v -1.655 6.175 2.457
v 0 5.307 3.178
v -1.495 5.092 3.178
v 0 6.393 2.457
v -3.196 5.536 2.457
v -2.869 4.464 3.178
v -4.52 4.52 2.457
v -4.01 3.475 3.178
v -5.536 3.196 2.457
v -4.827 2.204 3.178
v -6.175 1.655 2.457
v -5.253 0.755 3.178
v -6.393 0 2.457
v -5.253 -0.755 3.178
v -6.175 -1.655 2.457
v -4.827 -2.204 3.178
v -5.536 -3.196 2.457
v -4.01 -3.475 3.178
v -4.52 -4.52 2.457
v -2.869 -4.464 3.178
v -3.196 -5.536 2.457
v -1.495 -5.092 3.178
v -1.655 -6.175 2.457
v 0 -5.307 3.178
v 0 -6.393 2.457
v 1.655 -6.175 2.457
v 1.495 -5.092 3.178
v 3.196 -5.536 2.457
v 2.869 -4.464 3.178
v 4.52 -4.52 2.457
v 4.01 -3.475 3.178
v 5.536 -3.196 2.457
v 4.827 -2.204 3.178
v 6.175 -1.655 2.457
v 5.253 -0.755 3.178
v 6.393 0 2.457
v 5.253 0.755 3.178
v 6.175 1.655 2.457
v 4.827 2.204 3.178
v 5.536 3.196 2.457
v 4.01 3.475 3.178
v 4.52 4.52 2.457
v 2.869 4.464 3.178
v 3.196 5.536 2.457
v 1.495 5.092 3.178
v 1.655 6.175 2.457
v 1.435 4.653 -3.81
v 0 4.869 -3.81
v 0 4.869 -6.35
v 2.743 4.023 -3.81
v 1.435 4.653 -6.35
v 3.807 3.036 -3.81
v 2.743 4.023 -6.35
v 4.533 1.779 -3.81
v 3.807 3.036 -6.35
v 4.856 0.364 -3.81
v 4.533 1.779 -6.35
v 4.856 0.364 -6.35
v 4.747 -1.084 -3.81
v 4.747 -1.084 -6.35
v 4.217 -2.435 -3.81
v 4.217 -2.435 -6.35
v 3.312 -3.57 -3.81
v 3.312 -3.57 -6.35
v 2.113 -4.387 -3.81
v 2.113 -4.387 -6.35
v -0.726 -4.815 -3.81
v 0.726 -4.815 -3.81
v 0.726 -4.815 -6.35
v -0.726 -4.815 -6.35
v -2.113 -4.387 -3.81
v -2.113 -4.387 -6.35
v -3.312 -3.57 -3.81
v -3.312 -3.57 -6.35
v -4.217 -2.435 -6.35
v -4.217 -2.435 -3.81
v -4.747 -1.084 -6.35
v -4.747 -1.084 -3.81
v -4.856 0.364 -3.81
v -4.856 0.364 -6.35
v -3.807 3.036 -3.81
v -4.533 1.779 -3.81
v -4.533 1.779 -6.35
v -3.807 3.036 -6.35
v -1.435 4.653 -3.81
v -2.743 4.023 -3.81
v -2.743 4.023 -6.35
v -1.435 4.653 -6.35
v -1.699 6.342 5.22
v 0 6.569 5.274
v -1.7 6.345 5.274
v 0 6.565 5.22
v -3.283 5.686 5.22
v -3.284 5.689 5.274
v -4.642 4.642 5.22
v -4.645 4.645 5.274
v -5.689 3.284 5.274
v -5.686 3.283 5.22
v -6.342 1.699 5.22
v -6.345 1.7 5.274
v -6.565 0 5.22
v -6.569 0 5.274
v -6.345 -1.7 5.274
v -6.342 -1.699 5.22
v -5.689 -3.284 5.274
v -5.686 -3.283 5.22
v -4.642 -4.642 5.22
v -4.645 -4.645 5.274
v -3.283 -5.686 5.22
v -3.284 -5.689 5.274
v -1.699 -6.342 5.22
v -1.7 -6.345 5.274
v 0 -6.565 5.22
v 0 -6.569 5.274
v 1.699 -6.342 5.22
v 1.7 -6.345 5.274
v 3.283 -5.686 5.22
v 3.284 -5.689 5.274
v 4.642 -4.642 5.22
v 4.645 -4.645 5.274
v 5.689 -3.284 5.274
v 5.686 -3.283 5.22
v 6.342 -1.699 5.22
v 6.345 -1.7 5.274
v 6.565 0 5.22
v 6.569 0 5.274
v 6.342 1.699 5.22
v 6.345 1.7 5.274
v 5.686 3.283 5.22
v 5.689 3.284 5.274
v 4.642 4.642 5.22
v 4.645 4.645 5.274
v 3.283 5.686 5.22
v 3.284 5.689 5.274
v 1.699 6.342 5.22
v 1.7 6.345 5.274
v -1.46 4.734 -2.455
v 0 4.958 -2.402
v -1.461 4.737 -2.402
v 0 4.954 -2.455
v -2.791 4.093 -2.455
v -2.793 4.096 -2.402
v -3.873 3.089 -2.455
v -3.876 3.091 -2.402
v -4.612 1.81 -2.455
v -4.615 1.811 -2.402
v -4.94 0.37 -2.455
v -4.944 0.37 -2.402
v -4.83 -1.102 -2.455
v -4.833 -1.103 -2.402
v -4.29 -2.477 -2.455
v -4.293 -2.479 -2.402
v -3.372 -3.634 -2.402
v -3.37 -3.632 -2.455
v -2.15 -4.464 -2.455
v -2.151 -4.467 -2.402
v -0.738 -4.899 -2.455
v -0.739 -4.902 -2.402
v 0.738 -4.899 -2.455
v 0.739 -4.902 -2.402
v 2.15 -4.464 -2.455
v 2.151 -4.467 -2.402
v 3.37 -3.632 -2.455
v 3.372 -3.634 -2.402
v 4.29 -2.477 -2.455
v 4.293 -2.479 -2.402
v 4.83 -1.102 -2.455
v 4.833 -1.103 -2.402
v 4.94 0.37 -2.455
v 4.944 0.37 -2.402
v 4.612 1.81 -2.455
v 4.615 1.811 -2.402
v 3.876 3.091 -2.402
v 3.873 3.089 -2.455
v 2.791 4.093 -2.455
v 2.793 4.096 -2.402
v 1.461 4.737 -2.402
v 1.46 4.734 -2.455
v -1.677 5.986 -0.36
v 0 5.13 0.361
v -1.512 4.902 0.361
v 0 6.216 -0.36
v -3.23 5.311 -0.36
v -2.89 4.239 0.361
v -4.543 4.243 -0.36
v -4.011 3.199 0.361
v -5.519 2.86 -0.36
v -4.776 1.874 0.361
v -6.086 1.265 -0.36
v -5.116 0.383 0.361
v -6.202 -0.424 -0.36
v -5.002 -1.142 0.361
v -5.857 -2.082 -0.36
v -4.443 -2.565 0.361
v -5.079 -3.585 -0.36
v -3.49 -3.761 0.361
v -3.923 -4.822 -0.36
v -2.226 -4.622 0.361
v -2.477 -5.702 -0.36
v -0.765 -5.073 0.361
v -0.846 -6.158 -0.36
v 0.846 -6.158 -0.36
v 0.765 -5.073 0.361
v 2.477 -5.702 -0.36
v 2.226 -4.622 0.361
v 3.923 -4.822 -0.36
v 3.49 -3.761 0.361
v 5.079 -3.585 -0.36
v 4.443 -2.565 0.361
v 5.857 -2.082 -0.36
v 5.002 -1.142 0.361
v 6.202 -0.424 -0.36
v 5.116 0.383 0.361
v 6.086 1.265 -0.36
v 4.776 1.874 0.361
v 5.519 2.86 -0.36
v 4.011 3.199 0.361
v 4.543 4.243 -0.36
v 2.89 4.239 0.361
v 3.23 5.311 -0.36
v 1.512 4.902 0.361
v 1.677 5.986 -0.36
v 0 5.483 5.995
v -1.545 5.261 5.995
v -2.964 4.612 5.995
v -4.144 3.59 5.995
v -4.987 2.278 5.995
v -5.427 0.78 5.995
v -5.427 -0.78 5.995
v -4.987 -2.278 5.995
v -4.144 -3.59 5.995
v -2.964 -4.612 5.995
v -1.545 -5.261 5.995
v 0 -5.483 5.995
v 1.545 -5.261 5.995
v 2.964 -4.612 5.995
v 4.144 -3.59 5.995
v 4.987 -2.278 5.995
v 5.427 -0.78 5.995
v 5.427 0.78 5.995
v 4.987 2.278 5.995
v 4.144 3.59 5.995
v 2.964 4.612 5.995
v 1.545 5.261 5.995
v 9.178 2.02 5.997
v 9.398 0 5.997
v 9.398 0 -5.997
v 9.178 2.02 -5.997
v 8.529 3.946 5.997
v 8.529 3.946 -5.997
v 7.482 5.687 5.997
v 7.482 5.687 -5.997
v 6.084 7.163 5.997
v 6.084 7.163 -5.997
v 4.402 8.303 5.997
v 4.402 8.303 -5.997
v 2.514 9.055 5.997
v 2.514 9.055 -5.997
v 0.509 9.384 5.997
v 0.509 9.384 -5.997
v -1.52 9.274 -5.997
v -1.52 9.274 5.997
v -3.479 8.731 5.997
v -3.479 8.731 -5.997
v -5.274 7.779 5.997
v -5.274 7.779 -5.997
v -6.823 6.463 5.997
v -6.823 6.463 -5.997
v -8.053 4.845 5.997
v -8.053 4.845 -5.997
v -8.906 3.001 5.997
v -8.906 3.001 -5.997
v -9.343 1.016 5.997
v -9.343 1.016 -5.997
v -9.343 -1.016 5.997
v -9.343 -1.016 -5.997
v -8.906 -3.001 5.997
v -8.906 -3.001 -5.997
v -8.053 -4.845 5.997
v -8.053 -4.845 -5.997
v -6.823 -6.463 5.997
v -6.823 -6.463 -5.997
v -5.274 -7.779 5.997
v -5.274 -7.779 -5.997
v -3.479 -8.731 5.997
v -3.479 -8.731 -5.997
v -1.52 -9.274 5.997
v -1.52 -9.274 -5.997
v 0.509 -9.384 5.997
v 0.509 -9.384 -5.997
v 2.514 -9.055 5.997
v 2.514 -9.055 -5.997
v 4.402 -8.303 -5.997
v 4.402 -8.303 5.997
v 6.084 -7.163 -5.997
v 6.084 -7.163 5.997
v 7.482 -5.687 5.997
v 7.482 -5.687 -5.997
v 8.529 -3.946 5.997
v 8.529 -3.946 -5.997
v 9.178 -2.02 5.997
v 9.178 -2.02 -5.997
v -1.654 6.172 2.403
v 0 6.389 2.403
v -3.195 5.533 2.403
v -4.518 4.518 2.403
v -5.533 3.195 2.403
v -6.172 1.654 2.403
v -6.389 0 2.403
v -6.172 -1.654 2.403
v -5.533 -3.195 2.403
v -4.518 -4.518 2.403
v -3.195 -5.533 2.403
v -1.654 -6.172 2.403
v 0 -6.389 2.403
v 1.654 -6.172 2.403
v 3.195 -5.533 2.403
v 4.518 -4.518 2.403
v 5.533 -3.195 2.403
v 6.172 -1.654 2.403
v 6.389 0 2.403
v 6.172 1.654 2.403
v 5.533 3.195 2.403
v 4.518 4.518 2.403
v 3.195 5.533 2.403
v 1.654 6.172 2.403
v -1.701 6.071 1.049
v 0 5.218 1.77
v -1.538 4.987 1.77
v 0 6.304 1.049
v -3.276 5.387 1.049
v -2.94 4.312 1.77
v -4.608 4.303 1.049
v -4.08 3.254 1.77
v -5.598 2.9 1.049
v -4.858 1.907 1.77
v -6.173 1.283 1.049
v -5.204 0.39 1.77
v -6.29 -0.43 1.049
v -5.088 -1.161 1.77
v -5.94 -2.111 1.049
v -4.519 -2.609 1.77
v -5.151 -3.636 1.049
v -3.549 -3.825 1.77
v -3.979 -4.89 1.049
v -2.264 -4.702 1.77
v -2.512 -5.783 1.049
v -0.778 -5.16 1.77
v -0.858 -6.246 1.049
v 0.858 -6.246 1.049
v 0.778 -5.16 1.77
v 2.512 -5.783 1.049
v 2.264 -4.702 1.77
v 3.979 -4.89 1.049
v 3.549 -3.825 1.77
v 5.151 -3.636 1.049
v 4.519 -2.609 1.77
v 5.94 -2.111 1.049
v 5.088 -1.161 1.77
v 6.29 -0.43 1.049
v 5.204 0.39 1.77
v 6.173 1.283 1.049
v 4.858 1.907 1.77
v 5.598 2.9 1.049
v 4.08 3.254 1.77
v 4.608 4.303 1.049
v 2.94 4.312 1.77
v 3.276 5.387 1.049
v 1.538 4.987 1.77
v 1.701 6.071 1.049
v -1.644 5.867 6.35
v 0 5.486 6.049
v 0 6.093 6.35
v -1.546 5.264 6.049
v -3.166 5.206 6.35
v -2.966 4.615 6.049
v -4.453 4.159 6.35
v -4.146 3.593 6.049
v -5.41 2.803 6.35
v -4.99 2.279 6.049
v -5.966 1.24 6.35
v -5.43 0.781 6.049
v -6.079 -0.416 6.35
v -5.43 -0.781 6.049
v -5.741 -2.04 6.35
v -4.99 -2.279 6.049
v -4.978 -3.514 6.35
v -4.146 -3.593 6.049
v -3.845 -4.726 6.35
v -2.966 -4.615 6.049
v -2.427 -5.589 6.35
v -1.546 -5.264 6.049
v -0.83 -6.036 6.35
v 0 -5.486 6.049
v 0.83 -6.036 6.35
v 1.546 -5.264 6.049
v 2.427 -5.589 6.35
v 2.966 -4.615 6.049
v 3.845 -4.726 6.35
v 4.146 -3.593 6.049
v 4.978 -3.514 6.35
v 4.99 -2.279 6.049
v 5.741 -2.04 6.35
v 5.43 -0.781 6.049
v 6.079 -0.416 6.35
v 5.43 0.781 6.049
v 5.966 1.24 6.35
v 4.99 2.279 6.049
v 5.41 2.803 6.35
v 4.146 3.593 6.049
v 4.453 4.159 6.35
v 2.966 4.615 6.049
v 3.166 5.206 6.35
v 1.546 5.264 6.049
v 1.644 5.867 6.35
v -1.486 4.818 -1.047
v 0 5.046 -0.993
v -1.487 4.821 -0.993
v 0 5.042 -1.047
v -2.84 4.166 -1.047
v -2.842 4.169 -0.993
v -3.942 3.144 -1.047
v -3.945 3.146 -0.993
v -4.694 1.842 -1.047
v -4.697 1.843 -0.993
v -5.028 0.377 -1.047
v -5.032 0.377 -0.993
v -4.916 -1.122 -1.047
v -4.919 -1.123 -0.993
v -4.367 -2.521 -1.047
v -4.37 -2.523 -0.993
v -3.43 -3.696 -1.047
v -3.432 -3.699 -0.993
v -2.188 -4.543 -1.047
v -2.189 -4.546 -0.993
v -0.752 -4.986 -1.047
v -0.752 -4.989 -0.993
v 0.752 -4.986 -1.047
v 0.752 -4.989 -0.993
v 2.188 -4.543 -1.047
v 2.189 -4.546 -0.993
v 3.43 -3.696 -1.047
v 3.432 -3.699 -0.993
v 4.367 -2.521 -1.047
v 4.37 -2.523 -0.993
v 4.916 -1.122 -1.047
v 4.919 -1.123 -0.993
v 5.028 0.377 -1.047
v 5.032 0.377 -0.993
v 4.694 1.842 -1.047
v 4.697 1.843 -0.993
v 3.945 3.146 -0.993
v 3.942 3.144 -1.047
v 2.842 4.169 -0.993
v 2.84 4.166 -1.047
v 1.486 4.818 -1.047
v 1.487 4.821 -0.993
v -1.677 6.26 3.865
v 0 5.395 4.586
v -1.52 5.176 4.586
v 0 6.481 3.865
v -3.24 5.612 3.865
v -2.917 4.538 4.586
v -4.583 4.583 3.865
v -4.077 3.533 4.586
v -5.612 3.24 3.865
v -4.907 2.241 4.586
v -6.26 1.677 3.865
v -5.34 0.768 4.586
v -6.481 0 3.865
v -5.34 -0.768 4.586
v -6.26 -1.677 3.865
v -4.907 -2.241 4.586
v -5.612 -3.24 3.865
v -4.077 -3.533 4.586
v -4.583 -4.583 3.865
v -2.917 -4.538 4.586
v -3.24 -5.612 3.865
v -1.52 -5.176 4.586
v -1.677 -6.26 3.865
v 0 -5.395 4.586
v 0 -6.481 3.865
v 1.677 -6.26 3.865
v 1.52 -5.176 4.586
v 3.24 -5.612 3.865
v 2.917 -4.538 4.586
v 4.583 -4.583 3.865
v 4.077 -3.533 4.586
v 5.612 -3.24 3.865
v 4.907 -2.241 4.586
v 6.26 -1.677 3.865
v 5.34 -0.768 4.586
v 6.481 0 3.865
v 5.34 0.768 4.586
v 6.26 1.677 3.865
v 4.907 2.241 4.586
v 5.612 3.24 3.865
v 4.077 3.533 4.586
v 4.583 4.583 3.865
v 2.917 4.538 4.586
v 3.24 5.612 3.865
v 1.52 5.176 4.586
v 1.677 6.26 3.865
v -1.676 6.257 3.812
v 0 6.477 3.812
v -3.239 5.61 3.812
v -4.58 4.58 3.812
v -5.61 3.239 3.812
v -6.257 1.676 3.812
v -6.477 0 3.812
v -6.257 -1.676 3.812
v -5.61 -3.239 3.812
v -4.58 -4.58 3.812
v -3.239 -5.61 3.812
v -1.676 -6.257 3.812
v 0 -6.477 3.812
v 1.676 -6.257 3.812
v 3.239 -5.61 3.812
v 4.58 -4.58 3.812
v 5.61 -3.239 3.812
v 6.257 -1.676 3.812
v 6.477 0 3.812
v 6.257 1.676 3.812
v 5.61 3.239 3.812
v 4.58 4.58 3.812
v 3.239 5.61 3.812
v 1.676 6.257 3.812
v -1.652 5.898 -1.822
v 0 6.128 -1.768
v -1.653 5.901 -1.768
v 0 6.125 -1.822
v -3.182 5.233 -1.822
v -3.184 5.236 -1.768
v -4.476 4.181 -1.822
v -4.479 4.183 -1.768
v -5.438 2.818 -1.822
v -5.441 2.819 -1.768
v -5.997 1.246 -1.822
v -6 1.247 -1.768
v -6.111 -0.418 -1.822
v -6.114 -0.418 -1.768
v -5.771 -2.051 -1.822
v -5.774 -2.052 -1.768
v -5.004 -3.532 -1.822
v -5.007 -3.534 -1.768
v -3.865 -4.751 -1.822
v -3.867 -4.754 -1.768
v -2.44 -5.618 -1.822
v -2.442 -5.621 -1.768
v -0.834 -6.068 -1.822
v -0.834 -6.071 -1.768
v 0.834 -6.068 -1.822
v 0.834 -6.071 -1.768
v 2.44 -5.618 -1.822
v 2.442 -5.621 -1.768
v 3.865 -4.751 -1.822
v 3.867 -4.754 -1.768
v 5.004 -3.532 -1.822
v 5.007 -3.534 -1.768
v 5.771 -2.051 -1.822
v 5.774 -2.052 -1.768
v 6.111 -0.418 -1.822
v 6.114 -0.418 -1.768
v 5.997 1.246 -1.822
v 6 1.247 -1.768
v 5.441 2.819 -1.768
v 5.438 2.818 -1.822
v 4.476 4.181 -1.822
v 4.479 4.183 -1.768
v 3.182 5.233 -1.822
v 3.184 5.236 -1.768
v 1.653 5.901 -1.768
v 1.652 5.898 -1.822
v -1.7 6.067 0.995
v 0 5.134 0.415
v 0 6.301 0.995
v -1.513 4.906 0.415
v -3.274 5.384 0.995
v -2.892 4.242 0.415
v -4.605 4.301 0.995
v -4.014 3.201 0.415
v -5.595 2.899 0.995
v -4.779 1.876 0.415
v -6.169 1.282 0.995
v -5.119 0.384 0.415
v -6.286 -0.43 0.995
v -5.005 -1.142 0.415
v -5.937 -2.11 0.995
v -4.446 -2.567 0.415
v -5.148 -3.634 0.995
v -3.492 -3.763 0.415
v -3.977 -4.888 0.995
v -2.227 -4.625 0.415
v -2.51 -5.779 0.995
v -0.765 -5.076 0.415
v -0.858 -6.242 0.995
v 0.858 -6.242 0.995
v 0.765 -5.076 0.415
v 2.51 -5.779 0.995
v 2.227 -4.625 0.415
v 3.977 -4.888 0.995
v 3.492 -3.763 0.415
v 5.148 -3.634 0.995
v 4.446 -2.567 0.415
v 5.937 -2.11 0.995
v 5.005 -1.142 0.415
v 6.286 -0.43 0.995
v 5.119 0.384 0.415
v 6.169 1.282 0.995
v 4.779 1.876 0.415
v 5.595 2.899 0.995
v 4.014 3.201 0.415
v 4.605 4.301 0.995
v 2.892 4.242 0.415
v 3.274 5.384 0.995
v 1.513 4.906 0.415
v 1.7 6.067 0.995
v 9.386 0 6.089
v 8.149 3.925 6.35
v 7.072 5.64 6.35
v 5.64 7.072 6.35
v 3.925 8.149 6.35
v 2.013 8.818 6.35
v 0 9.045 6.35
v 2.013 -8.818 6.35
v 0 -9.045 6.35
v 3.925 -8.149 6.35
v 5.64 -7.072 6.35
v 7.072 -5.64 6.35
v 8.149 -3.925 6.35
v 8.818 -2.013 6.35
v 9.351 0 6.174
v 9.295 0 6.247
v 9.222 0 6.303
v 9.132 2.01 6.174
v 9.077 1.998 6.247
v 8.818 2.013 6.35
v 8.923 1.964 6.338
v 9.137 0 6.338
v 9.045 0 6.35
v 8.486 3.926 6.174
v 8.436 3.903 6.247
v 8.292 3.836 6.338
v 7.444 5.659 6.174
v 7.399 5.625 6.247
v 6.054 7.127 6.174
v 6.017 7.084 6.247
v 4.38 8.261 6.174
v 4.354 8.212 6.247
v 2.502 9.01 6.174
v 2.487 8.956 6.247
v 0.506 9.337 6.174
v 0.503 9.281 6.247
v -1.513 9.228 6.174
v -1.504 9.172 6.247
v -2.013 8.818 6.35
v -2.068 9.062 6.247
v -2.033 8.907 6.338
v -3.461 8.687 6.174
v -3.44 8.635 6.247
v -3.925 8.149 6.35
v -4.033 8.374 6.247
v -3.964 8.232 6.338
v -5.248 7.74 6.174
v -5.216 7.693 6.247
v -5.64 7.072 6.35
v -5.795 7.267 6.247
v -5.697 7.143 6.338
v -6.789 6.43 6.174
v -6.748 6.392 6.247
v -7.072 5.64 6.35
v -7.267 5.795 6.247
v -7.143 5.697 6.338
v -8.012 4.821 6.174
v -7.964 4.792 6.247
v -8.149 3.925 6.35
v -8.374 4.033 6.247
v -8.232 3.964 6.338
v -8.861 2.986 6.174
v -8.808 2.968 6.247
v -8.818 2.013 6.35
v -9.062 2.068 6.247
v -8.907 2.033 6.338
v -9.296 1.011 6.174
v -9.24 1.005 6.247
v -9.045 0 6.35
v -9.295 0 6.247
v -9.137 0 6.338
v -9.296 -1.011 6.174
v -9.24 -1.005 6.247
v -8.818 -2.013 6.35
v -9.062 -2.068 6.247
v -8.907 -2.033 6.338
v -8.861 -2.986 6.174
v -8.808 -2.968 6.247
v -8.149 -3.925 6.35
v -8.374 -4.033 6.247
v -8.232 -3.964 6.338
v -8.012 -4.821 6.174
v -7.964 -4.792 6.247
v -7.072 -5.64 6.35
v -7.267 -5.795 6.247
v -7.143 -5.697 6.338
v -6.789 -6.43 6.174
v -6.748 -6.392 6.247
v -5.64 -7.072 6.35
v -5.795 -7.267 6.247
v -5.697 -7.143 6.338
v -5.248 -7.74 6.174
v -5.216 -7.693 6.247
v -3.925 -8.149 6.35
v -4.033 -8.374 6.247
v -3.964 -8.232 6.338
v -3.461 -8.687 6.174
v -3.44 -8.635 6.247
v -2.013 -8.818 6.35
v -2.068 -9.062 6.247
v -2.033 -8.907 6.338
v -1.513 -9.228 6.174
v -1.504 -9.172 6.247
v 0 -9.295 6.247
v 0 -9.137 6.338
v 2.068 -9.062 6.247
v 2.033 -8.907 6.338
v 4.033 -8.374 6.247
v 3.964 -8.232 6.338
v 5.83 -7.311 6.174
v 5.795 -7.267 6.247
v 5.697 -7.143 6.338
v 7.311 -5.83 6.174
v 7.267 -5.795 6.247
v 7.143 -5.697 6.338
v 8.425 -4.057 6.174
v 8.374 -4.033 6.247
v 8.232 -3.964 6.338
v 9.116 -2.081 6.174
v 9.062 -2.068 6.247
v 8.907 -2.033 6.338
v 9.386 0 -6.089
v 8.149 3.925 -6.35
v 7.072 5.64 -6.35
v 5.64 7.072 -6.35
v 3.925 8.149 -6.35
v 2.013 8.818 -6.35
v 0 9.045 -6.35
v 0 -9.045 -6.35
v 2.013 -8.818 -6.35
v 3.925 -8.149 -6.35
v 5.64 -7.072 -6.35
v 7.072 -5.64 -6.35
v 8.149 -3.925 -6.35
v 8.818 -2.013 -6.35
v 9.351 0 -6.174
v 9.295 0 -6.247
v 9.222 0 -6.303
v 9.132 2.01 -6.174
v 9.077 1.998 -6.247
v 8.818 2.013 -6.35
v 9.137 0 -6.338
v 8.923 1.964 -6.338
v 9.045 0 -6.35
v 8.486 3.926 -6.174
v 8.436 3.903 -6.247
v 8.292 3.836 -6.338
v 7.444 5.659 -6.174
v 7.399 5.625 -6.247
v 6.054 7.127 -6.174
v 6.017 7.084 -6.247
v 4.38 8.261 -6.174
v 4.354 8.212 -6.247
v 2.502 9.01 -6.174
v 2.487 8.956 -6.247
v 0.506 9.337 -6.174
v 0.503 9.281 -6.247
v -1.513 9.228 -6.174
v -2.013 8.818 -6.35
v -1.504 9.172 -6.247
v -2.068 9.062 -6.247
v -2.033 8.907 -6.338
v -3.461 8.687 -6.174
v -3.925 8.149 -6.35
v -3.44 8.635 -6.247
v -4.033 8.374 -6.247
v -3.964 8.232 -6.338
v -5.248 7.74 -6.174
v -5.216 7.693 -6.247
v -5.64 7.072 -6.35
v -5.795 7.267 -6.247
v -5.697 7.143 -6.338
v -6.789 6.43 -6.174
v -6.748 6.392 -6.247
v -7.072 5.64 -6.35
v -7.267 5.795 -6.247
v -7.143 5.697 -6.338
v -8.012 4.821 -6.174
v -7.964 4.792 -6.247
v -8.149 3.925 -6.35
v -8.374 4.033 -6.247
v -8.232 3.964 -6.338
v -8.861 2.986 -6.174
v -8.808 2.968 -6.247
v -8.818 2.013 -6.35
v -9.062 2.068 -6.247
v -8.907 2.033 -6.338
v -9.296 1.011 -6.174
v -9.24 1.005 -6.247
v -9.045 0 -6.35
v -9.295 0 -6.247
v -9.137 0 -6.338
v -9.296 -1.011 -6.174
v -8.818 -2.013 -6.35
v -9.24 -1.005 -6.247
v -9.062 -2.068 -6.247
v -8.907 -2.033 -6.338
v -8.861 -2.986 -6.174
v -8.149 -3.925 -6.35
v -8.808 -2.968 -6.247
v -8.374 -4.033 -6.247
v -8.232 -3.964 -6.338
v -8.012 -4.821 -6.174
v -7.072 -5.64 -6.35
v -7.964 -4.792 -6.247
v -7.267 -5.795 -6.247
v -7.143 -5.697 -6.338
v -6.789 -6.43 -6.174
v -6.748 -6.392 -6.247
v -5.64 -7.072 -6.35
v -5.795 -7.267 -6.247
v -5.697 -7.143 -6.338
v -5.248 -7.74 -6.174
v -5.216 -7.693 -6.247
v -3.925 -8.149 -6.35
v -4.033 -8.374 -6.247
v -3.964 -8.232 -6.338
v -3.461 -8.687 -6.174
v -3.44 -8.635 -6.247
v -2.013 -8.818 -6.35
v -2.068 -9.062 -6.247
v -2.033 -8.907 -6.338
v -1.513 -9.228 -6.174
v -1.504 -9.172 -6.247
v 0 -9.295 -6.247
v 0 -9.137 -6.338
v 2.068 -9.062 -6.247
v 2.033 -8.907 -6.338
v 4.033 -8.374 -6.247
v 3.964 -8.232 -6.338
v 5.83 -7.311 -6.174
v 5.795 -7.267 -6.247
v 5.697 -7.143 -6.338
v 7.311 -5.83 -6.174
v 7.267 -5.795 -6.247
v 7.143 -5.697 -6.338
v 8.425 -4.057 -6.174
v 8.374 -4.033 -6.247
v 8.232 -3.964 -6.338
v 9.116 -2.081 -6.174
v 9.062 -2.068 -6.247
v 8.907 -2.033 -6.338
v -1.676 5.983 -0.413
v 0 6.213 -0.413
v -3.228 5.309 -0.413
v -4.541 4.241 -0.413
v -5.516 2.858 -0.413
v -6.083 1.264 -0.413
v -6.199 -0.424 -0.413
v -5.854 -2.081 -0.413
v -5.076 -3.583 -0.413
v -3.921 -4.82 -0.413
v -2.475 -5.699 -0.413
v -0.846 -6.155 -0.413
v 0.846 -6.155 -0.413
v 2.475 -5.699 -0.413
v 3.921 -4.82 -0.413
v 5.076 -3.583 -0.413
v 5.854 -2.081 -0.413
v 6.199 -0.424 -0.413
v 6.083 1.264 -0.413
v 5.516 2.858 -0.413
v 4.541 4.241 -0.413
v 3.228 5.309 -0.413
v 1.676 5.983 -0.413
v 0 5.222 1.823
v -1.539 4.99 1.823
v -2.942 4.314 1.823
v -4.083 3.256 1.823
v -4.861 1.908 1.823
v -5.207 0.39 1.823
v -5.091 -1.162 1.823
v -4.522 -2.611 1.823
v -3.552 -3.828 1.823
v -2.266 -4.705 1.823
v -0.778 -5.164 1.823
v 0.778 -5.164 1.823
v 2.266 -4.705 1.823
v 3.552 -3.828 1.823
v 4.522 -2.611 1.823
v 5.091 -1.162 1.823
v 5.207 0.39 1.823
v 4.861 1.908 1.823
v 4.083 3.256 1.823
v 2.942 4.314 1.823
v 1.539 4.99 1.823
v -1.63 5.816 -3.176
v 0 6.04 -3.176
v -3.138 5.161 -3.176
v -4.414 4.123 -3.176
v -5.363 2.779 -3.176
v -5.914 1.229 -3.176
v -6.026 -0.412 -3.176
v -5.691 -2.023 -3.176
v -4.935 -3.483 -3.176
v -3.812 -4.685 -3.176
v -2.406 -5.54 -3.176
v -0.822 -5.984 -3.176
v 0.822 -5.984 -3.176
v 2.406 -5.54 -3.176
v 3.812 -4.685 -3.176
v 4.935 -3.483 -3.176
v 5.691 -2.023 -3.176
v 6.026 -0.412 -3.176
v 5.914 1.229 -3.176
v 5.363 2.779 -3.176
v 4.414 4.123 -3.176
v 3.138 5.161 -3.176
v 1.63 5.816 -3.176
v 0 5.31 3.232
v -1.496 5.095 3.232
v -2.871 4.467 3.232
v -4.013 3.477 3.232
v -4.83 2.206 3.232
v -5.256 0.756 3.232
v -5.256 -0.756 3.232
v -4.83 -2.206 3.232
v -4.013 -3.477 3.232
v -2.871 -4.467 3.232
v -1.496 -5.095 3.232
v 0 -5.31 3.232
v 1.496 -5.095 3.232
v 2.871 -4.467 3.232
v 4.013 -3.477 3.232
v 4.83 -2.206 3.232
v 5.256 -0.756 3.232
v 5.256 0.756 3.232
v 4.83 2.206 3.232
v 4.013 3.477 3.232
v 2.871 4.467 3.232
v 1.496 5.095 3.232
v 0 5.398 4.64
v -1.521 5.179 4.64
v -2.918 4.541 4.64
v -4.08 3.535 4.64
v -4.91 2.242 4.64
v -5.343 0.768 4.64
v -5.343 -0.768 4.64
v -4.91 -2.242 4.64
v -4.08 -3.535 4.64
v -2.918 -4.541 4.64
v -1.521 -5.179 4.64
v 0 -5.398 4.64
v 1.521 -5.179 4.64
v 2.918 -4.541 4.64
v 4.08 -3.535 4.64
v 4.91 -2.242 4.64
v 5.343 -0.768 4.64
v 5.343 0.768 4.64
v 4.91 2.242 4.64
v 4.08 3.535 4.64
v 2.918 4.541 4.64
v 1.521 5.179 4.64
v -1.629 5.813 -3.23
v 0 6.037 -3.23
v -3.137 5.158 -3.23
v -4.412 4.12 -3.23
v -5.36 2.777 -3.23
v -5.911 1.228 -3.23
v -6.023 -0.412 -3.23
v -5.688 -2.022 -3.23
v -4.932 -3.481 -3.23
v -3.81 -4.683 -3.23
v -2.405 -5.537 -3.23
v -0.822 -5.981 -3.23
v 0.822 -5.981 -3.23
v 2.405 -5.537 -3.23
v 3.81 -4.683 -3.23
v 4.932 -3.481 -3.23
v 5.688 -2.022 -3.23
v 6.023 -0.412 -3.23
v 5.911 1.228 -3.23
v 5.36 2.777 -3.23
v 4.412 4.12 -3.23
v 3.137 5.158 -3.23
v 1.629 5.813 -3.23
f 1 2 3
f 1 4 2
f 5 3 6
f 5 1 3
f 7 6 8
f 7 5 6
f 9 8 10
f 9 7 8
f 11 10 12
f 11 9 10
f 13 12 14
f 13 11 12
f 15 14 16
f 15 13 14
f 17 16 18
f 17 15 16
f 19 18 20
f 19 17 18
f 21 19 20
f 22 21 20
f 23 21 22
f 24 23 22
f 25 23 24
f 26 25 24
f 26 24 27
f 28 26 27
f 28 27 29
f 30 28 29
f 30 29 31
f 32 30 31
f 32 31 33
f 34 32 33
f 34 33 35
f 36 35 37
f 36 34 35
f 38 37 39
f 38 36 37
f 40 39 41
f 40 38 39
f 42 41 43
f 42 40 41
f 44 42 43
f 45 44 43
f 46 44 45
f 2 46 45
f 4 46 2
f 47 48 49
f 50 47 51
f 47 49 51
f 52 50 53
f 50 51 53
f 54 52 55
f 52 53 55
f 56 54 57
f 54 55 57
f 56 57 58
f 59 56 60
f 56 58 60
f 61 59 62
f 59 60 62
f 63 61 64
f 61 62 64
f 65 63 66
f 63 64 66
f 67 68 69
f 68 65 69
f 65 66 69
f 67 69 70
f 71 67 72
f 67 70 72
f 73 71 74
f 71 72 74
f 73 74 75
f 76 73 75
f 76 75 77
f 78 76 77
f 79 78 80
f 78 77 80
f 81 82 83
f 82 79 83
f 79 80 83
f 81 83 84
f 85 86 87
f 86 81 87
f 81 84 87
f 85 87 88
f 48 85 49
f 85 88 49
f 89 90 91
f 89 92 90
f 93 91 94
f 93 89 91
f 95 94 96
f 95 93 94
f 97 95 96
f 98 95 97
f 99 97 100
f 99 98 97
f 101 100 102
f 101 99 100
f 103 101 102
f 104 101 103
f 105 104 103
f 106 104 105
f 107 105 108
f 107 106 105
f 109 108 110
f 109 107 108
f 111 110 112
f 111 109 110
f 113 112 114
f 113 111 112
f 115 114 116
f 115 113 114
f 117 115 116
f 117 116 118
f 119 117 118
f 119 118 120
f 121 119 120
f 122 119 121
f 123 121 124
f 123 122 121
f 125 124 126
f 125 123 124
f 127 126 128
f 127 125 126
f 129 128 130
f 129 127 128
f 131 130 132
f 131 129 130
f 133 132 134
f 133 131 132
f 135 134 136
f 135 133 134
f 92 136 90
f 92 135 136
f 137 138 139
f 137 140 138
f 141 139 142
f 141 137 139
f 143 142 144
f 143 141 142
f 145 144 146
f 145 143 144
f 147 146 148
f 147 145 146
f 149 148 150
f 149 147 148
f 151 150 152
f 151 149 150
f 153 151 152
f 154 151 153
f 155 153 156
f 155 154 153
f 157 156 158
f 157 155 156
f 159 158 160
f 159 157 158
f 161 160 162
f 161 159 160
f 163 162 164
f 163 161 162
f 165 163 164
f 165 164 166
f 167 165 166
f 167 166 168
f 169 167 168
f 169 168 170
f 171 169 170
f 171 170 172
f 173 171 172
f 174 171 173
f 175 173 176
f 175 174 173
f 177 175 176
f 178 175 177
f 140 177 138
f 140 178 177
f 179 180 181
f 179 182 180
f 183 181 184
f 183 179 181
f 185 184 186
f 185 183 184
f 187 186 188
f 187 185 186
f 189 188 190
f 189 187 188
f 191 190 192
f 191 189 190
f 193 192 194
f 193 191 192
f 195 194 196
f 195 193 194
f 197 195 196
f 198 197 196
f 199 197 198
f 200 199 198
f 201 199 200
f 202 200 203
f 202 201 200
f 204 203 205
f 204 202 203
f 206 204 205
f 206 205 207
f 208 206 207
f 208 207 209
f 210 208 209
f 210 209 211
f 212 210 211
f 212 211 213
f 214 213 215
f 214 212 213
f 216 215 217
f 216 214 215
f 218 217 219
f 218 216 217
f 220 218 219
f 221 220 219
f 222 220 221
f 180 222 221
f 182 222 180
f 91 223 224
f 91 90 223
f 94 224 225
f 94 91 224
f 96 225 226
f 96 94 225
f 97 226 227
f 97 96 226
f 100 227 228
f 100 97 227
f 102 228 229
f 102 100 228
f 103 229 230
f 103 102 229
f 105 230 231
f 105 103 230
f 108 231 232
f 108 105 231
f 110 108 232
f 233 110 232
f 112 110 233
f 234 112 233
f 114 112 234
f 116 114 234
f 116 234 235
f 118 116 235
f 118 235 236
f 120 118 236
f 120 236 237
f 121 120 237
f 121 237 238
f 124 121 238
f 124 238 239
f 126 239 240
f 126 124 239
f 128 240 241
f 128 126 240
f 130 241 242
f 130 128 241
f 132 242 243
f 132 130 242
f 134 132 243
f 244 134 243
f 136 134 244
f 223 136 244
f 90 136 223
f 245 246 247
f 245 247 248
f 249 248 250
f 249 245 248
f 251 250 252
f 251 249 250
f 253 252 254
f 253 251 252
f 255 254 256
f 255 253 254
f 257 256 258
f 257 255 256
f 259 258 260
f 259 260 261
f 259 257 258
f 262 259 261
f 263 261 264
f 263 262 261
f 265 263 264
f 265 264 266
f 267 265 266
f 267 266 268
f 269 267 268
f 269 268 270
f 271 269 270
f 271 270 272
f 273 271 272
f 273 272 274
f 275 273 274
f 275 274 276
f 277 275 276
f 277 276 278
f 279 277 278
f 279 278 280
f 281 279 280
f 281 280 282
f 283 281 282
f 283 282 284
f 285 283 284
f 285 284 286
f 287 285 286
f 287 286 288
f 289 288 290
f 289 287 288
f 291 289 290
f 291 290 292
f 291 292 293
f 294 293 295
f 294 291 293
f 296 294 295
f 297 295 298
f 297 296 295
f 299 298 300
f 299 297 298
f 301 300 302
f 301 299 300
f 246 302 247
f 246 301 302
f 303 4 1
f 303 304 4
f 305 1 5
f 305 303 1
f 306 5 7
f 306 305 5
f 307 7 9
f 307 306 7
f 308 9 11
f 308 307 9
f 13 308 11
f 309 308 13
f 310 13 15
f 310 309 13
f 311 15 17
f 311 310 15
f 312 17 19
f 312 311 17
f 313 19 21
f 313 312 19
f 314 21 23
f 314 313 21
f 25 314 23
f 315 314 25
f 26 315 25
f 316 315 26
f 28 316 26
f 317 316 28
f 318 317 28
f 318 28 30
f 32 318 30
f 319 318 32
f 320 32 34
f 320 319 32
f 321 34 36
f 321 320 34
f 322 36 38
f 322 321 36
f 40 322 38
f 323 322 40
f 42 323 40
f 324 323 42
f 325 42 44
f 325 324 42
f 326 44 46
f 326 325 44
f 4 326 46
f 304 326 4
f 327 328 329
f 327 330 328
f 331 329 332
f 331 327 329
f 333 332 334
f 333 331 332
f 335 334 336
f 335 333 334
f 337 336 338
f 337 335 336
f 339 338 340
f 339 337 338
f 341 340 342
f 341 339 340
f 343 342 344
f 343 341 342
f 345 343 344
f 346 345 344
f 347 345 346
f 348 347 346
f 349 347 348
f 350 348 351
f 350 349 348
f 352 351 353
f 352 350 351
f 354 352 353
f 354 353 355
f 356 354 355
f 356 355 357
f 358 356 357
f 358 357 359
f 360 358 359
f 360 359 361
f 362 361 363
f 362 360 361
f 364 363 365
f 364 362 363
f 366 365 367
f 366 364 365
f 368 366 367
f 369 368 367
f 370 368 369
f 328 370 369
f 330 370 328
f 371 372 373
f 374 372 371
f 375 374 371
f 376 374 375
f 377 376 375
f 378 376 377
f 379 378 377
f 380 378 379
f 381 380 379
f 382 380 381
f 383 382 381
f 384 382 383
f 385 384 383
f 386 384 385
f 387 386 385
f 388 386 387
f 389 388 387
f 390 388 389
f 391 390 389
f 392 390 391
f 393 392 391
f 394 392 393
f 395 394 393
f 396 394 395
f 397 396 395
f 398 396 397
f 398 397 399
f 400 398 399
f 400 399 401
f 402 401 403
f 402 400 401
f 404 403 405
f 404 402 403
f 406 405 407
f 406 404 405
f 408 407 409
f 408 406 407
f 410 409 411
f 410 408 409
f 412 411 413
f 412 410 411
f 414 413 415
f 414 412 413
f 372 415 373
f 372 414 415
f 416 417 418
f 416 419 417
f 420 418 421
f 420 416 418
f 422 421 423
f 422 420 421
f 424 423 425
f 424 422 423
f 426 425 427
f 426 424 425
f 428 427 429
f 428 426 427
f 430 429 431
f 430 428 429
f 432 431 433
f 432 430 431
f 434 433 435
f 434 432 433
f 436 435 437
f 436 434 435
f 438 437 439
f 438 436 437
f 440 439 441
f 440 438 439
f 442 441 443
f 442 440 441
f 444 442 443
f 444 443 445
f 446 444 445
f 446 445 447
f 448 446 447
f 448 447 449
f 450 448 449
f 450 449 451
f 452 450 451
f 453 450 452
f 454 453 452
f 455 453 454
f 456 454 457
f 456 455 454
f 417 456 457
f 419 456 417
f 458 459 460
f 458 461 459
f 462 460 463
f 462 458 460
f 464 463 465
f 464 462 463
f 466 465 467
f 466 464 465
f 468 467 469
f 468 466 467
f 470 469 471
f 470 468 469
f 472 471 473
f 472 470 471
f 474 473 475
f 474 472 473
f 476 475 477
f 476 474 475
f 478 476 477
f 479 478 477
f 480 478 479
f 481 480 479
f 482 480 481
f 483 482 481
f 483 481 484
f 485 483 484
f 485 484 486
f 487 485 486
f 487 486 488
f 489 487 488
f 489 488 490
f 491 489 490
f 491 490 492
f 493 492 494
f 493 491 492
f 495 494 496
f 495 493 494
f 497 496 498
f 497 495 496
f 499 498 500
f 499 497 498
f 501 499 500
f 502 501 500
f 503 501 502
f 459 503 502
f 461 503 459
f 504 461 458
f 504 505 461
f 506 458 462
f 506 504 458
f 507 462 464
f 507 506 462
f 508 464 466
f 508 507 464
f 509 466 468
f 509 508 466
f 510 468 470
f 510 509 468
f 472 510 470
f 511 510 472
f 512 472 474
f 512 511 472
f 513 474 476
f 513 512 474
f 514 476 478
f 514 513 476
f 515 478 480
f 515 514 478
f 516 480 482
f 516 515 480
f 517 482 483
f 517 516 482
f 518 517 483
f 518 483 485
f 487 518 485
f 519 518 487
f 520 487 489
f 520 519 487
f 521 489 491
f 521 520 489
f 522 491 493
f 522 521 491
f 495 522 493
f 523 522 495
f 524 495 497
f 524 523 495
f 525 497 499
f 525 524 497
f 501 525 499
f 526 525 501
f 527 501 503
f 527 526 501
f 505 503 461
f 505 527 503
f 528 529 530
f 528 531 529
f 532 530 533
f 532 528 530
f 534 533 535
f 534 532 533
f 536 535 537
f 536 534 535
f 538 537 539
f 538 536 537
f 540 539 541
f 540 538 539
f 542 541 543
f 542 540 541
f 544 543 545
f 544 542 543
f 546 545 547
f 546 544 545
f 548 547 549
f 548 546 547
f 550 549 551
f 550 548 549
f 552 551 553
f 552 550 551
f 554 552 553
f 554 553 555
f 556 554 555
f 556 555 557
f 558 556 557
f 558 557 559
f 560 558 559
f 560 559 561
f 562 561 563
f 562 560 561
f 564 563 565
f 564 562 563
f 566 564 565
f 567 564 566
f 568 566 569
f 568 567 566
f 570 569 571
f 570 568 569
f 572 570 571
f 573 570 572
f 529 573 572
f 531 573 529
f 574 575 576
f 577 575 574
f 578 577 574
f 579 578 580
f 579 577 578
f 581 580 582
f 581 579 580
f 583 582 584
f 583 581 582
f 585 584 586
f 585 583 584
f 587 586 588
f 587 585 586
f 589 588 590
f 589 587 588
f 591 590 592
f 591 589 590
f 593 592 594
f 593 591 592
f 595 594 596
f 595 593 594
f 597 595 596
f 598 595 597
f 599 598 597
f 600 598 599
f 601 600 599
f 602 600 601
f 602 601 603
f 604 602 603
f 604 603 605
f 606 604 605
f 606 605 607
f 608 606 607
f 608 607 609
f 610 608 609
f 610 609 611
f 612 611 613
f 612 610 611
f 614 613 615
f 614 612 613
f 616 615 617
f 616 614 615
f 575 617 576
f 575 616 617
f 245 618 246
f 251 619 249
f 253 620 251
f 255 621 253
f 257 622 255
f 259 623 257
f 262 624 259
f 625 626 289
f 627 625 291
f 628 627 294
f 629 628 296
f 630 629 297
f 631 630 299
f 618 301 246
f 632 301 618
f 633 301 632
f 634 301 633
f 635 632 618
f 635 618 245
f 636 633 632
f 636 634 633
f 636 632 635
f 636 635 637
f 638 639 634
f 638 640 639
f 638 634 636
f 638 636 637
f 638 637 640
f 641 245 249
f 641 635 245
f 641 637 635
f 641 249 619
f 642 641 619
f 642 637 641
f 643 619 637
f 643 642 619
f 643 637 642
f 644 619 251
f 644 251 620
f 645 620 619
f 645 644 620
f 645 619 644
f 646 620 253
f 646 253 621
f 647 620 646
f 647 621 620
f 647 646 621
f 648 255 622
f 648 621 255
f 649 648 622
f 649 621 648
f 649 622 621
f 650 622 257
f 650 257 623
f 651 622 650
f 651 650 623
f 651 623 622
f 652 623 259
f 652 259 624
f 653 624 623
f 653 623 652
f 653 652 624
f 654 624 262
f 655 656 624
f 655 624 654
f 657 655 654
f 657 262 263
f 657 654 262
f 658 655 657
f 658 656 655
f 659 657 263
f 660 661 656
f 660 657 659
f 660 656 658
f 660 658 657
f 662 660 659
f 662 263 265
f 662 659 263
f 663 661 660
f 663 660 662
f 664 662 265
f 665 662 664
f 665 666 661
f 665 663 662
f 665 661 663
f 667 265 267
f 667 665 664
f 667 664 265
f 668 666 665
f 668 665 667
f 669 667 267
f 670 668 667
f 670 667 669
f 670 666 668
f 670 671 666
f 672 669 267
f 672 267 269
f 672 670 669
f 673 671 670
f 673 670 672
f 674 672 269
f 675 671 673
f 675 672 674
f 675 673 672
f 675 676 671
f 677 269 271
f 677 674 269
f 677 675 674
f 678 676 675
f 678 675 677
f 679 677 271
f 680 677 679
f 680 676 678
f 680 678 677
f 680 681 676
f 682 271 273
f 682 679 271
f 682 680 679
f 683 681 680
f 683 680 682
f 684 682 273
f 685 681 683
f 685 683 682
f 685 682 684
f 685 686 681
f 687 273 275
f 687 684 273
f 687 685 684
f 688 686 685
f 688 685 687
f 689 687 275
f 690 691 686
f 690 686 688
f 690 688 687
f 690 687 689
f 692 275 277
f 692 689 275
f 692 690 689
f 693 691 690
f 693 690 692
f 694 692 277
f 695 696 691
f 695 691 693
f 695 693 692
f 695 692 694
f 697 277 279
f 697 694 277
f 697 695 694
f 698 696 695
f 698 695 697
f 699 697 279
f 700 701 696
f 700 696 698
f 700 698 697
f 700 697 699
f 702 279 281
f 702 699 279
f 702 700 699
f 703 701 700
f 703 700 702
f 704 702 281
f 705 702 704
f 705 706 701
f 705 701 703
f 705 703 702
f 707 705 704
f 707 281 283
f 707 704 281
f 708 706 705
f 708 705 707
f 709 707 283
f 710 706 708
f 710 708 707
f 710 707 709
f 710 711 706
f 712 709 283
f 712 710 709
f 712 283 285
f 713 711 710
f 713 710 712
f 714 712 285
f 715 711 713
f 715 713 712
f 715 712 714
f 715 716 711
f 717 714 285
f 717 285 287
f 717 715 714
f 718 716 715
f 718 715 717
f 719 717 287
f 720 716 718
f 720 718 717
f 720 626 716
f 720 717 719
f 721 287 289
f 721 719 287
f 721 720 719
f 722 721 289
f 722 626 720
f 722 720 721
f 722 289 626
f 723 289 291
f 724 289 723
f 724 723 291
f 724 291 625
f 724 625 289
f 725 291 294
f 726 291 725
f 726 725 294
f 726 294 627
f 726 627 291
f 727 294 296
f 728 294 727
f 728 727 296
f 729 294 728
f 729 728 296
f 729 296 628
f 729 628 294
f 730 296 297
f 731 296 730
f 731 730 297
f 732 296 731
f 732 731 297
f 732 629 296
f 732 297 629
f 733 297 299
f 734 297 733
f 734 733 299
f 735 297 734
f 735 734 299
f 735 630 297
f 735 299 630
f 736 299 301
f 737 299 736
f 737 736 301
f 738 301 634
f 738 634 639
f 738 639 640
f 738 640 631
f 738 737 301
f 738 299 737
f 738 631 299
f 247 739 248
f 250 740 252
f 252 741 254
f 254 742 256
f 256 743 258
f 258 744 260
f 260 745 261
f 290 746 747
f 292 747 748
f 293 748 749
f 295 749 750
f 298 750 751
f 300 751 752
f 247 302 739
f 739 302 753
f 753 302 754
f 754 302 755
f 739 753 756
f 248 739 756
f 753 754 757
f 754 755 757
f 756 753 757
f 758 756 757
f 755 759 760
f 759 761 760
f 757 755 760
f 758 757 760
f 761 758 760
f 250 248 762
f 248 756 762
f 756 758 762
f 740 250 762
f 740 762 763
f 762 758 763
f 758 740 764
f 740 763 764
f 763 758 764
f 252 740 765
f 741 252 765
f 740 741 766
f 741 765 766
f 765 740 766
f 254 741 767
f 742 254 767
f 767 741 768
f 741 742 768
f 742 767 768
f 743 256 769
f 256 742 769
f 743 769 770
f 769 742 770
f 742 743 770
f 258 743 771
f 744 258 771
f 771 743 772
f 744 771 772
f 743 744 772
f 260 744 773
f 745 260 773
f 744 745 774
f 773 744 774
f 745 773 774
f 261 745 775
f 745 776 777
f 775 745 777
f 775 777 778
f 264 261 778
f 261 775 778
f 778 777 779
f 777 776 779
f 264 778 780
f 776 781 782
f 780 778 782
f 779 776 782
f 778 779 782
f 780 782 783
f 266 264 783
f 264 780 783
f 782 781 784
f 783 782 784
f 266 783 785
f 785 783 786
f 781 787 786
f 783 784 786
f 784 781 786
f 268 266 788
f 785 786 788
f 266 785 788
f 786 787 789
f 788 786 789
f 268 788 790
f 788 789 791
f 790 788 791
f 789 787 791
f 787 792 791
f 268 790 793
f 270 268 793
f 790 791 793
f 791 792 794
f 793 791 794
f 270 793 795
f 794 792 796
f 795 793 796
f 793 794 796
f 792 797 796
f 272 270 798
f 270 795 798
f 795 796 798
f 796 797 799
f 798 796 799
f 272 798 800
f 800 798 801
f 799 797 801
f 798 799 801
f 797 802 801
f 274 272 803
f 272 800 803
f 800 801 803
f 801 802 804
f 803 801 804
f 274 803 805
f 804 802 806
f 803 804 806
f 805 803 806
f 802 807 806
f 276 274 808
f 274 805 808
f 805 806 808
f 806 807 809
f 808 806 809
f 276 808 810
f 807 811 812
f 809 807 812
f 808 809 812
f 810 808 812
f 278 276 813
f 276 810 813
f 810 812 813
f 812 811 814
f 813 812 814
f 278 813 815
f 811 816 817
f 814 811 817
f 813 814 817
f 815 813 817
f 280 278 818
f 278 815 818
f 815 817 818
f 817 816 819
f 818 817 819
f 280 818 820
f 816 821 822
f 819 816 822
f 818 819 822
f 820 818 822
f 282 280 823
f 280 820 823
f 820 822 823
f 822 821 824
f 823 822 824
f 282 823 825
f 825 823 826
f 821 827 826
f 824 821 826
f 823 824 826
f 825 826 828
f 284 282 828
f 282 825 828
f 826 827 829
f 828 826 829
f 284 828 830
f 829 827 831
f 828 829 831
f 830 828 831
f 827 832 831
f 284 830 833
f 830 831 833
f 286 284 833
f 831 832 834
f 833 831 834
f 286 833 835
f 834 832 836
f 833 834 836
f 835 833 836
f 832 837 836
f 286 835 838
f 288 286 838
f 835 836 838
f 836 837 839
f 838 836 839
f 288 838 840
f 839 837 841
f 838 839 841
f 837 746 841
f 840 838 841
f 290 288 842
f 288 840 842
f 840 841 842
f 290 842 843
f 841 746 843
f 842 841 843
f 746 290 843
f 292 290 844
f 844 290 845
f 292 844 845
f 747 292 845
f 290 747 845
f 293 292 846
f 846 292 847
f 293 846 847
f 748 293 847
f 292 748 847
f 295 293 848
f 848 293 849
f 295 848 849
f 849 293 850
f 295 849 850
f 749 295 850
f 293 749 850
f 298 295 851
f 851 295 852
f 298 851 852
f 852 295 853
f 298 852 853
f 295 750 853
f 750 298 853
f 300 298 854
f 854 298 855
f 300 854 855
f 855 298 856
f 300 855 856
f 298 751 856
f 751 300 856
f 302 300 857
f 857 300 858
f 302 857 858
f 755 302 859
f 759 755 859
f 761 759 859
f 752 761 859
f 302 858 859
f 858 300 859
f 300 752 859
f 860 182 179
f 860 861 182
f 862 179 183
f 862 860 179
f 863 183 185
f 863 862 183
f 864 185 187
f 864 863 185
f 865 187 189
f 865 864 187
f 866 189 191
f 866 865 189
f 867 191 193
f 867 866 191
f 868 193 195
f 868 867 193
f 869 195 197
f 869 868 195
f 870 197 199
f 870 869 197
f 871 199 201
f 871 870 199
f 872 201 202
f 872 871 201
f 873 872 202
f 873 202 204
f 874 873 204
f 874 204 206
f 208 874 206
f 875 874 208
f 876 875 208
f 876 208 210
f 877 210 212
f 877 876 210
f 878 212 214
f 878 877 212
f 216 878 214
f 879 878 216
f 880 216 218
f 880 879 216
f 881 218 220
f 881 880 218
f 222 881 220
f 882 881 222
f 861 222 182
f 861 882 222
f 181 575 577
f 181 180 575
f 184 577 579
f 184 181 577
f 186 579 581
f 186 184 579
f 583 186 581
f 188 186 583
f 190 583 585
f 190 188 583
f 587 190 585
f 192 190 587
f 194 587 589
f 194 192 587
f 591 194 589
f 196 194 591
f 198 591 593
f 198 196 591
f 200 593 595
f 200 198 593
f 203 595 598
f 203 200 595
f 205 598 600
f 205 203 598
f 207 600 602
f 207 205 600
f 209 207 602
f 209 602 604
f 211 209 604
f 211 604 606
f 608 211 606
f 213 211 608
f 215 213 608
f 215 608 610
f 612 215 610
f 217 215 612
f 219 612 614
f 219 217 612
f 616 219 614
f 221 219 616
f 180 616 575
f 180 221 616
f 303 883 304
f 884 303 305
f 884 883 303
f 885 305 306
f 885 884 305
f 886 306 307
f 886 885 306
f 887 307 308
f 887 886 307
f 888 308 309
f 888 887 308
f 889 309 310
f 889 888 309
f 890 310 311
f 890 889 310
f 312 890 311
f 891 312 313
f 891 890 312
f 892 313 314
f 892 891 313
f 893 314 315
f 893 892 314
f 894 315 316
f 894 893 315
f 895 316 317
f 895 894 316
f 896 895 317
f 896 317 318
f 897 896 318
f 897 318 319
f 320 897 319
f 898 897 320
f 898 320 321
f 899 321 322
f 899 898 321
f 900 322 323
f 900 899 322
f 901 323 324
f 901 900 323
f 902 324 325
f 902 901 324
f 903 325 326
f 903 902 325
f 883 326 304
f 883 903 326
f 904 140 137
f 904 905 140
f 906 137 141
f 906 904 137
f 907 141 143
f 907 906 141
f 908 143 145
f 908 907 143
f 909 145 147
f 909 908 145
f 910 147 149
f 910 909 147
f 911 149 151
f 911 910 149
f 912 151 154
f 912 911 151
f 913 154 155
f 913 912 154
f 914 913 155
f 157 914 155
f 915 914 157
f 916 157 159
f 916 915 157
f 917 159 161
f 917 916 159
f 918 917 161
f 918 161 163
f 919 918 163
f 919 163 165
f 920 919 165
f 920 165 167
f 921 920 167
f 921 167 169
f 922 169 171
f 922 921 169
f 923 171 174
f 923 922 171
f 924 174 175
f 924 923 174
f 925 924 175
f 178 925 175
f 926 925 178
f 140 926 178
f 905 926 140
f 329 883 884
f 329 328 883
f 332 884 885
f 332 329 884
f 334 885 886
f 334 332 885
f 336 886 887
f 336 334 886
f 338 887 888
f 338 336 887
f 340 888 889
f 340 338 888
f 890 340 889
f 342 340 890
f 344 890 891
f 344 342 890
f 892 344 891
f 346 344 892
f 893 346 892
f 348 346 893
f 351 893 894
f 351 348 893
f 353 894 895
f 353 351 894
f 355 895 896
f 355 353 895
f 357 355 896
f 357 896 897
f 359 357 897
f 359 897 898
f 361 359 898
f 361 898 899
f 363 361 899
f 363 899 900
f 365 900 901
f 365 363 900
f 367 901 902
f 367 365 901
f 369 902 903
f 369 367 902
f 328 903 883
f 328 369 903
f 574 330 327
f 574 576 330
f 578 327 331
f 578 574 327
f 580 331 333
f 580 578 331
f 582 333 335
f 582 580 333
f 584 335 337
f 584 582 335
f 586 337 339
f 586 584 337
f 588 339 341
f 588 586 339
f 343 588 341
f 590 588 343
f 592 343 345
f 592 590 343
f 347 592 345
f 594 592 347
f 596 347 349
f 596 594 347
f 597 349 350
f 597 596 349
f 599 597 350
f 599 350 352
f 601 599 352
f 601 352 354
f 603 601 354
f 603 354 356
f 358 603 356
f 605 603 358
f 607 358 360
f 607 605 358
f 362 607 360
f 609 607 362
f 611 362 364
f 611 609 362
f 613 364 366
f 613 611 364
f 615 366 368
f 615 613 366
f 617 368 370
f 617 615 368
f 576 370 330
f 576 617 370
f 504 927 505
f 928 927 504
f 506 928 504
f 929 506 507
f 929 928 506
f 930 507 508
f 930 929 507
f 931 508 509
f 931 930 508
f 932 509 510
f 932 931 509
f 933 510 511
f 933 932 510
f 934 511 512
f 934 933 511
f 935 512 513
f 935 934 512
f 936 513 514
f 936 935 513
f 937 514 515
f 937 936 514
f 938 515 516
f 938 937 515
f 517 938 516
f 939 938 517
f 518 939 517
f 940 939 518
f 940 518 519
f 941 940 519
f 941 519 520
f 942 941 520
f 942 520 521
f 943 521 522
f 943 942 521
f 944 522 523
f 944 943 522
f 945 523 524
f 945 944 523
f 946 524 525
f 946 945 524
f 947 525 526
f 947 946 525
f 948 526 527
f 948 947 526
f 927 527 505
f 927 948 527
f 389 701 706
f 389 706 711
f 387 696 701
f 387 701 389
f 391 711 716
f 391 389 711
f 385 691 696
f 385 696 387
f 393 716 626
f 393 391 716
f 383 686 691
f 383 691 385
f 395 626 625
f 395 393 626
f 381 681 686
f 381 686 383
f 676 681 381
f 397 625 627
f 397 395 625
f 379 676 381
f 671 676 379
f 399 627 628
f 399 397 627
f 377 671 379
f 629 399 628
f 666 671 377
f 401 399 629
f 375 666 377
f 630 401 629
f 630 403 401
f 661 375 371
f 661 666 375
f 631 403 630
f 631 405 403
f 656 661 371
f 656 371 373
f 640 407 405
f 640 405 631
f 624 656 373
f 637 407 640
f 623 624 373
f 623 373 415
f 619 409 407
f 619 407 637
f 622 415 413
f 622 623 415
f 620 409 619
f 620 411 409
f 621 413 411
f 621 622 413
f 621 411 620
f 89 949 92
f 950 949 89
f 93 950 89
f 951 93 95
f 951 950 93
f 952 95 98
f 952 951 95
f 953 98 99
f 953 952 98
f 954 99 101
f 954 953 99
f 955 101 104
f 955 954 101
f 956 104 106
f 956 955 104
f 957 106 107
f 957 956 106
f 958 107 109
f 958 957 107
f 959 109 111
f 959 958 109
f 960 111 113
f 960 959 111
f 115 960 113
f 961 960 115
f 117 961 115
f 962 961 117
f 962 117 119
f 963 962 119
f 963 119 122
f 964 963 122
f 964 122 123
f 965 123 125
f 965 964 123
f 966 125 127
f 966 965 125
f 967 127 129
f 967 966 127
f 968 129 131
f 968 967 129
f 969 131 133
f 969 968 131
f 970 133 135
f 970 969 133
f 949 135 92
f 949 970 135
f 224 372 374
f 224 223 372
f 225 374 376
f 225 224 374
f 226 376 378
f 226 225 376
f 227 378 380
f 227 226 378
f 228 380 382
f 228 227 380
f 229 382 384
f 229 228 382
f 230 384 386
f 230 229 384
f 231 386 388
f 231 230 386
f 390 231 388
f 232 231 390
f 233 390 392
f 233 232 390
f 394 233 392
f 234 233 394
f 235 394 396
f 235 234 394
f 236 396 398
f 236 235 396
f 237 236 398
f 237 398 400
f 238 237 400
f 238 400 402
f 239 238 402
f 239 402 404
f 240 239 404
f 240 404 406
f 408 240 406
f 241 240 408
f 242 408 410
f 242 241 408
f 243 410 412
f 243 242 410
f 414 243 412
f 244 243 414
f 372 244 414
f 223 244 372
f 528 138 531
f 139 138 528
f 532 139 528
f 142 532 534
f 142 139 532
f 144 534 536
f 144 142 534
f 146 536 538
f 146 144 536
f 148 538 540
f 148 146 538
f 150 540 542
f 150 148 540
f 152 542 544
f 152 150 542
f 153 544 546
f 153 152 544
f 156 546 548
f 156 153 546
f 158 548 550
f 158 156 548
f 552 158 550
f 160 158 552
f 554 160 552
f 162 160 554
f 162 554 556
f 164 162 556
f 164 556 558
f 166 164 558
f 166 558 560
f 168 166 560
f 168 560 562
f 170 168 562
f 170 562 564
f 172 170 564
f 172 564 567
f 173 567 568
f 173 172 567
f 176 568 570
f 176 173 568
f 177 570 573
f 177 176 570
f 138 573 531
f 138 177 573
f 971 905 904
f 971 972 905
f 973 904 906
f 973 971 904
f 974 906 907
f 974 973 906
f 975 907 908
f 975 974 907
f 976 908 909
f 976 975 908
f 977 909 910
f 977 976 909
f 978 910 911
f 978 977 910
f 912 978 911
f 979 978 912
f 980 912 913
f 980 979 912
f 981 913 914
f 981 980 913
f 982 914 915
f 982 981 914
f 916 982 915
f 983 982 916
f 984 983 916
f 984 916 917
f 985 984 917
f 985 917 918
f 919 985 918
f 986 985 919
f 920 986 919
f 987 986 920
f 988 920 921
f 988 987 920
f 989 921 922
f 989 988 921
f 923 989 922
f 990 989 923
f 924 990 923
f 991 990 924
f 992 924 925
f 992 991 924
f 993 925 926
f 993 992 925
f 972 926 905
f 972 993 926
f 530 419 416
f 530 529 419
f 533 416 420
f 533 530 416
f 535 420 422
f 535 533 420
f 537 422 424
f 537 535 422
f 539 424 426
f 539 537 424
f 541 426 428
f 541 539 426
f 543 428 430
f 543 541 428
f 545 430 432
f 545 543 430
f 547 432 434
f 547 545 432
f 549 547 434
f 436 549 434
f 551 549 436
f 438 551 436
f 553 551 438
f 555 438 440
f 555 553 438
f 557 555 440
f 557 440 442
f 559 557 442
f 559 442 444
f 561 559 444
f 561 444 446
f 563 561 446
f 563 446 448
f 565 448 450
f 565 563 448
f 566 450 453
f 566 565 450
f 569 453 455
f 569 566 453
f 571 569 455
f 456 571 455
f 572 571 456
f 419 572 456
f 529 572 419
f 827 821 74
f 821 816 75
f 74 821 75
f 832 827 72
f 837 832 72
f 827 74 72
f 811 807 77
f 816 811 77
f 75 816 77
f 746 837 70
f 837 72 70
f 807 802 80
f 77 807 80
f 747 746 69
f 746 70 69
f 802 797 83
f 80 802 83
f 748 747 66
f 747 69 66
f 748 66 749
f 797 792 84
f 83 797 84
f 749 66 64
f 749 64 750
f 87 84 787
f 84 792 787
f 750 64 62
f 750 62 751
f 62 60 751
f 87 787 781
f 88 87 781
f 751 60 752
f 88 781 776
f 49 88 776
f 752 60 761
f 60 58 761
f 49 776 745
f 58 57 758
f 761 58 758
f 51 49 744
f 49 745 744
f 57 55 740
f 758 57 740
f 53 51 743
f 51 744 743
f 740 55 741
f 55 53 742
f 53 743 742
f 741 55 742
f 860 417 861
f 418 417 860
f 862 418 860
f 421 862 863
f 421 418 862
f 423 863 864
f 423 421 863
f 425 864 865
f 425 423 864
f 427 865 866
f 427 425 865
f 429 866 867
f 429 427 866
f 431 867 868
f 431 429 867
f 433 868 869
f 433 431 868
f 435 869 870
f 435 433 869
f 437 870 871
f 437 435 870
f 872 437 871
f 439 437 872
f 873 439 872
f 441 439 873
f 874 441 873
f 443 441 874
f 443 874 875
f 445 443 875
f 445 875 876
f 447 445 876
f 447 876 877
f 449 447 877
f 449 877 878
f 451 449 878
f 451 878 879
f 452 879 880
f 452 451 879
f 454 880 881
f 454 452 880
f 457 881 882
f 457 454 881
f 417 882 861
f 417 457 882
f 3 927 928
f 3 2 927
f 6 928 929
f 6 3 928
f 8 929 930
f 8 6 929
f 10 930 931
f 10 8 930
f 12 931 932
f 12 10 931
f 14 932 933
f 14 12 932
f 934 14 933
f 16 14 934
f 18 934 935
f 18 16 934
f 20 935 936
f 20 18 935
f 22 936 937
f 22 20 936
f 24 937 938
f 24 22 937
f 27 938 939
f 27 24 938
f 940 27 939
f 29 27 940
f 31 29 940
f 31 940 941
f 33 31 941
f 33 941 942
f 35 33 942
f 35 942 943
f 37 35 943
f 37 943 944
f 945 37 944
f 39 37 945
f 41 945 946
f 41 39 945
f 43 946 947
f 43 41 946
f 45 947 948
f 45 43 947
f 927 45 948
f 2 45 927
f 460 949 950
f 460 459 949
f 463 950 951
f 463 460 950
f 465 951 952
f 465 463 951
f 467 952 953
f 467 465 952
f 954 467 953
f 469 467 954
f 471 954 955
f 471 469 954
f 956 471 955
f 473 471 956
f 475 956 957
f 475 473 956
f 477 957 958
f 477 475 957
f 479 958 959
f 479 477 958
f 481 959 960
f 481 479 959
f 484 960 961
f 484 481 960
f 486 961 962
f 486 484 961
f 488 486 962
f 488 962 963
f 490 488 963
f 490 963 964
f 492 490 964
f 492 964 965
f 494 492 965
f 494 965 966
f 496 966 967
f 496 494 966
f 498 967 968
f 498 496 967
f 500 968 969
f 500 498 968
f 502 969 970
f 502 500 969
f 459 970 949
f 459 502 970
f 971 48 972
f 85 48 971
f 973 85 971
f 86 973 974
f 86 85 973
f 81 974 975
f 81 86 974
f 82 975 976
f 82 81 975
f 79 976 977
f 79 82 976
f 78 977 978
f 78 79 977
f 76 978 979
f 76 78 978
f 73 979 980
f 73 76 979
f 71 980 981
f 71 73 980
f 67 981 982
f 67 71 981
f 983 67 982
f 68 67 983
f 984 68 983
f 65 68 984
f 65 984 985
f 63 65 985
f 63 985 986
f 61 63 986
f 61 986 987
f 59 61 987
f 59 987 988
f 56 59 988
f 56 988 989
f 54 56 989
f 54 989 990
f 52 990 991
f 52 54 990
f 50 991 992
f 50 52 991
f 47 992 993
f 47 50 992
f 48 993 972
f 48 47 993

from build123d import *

# Parameters (mm, degrees)
SKETCH1_R      = 9.398
EXTRUDE1_DEPTH = 6.35
SKETCH5_W      = 12.7
SKETCH5_H      = 4.869399387
FILLET1_R      = 0.352777778


with BuildPart() as part:
    # Sketch1 → Extrude1 (new body, symmetric)
    with BuildSketch(Plane.XY):
        Circle(SKETCH1_R)
    extrude(amount=EXTRUDE1_DEPTH, both=True)

    # Sketch5 → Cut-Revolve7 (revolve, cut)
    with BuildSketch(Plane(origin=(0, 0, 0), x_dir=(0, 0, -1), z_dir=(1, 0, 0))):
        with Locations((0, 2.434699694)):
            Rectangle(SKETCH5_W, SKETCH5_H)
    revolve(axis=Axis((0, 0, 0), (0, 0, -1)), mode=Mode.SUBTRACT)

    # Fillet1
    fillet1_edges = [part.edges().sort_by_distance(p)[0] for p in [
        (-9.398, 0, -6.35),
        (-9.398, 0, 6.35),
    ]]
    fillet(fillet1_edges, radius=FILLET1_R)

    # Sketch2 → Cut-Revolve5 (revolve, cut)
    with BuildSketch(Plane(origin=(0, 0, 0), x_dir=(0, 0, -1), z_dir=(1, 0, 0))):
        Polygon((-22.120436281, 7.622813225), (-21.540434076, 6.455429709), (-21.486747793, 6.452070868), (-20.765765115, 7.53805927), (-20.712078832, 7.534700429), (-20.132076627, 6.367316913), (-20.078390344, 6.363958072), (-19.357407666, 7.449946474), (-19.303721383, 7.446587633), (-18.723719178, 6.279204117), (-18.670032896, 6.275845277), (-17.949050217, 7.361833678), (-17.895363935, 7.358474838), (-17.31536173, 6.191091322), (-17.261675447, 6.187732481), (-16.540692769, 7.273720883), (-16.487006486, 7.270362042), (-15.907004281, 6.102978526), (-15.853317998, 6.099619685), (-15.13233532, 7.185608087), (-15.078649037, 7.182249246), (-14.498646832, 6.01486573), (-14.44496055, 6.01150689), (-13.723977871, 7.097495291), (-13.670291589, 7.094136451), (-13.090289384, 5.926752935), (-13.036603101, 5.923394094), (-12.315620423, 7.009382496), (-12.26193414, 7.006023655), (-11.681931935, 5.838640139), (-11.628245652, 5.835281298), (-10.907262974, 6.9212697), (-10.853576692, 6.917910859), (-10.273574486, 5.750527343), (-10.219888204, 5.747168503), (-9.498905526, 6.833156904), (-9.445219243, 6.829798064), (-8.865217038, 5.662414548), (-8.811530755, 5.659055707), (-8.090548077, 6.745044109), (-8.036861794, 6.741685268), (-7.456859589, 5.574301752), (-7.403173306, 5.570942911), (-6.682190628, 6.656931313), (-6.628504346, 6.653572472), (-6.04850214, 5.486188956), (-5.994815858, 5.482830116), (-5.27383318, 6.568818517), (-5.220146897, 6.565459677), (-4.640144692, 5.398076161), (-4.586458409, 5.39471732), (-3.865475731, 6.480705722), (-3.811789448, 6.477346881), (-3.231787243, 5.309963365), (-3.178100961, 5.306604524), (-2.457118282, 6.392592926), (-2.403432, 6.389234085), (-1.823429795, 5.221850569), (-1.769743512, 5.218491729), (-1.048760834, 6.30448013), (-0.995074551, 6.30112129), (-0.415072346, 5.133737774), (-0.361386063, 5.130378933), (0.359596615, 6.216367335), (0.413282898, 6.213008494), (0.993285103, 5.045624978), (1.046971385, 5.042266137), (1.767954064, 6.128254539), (1.821640346, 6.124895698), (2.401642551, 4.957512182), (2.455328834, 4.954153342), (3.176311512, 6.040141743), (3.229997795, 6.036782903), (3.81, 4.869399387), (3.81, 0), (-23.582480012, 0), (-23.582480012, 7.714284861), (-23.528793729, 7.71092602), (-22.948791524, 6.543542504), (-22.895105242, 6.540183664), (-22.174122563, 7.626172065), align=None)
    revolve(axis=Axis((0, 0, -97.9740637), (0, 0, 1)), mode=Mode.SUBTRACT)


solid = part.part
